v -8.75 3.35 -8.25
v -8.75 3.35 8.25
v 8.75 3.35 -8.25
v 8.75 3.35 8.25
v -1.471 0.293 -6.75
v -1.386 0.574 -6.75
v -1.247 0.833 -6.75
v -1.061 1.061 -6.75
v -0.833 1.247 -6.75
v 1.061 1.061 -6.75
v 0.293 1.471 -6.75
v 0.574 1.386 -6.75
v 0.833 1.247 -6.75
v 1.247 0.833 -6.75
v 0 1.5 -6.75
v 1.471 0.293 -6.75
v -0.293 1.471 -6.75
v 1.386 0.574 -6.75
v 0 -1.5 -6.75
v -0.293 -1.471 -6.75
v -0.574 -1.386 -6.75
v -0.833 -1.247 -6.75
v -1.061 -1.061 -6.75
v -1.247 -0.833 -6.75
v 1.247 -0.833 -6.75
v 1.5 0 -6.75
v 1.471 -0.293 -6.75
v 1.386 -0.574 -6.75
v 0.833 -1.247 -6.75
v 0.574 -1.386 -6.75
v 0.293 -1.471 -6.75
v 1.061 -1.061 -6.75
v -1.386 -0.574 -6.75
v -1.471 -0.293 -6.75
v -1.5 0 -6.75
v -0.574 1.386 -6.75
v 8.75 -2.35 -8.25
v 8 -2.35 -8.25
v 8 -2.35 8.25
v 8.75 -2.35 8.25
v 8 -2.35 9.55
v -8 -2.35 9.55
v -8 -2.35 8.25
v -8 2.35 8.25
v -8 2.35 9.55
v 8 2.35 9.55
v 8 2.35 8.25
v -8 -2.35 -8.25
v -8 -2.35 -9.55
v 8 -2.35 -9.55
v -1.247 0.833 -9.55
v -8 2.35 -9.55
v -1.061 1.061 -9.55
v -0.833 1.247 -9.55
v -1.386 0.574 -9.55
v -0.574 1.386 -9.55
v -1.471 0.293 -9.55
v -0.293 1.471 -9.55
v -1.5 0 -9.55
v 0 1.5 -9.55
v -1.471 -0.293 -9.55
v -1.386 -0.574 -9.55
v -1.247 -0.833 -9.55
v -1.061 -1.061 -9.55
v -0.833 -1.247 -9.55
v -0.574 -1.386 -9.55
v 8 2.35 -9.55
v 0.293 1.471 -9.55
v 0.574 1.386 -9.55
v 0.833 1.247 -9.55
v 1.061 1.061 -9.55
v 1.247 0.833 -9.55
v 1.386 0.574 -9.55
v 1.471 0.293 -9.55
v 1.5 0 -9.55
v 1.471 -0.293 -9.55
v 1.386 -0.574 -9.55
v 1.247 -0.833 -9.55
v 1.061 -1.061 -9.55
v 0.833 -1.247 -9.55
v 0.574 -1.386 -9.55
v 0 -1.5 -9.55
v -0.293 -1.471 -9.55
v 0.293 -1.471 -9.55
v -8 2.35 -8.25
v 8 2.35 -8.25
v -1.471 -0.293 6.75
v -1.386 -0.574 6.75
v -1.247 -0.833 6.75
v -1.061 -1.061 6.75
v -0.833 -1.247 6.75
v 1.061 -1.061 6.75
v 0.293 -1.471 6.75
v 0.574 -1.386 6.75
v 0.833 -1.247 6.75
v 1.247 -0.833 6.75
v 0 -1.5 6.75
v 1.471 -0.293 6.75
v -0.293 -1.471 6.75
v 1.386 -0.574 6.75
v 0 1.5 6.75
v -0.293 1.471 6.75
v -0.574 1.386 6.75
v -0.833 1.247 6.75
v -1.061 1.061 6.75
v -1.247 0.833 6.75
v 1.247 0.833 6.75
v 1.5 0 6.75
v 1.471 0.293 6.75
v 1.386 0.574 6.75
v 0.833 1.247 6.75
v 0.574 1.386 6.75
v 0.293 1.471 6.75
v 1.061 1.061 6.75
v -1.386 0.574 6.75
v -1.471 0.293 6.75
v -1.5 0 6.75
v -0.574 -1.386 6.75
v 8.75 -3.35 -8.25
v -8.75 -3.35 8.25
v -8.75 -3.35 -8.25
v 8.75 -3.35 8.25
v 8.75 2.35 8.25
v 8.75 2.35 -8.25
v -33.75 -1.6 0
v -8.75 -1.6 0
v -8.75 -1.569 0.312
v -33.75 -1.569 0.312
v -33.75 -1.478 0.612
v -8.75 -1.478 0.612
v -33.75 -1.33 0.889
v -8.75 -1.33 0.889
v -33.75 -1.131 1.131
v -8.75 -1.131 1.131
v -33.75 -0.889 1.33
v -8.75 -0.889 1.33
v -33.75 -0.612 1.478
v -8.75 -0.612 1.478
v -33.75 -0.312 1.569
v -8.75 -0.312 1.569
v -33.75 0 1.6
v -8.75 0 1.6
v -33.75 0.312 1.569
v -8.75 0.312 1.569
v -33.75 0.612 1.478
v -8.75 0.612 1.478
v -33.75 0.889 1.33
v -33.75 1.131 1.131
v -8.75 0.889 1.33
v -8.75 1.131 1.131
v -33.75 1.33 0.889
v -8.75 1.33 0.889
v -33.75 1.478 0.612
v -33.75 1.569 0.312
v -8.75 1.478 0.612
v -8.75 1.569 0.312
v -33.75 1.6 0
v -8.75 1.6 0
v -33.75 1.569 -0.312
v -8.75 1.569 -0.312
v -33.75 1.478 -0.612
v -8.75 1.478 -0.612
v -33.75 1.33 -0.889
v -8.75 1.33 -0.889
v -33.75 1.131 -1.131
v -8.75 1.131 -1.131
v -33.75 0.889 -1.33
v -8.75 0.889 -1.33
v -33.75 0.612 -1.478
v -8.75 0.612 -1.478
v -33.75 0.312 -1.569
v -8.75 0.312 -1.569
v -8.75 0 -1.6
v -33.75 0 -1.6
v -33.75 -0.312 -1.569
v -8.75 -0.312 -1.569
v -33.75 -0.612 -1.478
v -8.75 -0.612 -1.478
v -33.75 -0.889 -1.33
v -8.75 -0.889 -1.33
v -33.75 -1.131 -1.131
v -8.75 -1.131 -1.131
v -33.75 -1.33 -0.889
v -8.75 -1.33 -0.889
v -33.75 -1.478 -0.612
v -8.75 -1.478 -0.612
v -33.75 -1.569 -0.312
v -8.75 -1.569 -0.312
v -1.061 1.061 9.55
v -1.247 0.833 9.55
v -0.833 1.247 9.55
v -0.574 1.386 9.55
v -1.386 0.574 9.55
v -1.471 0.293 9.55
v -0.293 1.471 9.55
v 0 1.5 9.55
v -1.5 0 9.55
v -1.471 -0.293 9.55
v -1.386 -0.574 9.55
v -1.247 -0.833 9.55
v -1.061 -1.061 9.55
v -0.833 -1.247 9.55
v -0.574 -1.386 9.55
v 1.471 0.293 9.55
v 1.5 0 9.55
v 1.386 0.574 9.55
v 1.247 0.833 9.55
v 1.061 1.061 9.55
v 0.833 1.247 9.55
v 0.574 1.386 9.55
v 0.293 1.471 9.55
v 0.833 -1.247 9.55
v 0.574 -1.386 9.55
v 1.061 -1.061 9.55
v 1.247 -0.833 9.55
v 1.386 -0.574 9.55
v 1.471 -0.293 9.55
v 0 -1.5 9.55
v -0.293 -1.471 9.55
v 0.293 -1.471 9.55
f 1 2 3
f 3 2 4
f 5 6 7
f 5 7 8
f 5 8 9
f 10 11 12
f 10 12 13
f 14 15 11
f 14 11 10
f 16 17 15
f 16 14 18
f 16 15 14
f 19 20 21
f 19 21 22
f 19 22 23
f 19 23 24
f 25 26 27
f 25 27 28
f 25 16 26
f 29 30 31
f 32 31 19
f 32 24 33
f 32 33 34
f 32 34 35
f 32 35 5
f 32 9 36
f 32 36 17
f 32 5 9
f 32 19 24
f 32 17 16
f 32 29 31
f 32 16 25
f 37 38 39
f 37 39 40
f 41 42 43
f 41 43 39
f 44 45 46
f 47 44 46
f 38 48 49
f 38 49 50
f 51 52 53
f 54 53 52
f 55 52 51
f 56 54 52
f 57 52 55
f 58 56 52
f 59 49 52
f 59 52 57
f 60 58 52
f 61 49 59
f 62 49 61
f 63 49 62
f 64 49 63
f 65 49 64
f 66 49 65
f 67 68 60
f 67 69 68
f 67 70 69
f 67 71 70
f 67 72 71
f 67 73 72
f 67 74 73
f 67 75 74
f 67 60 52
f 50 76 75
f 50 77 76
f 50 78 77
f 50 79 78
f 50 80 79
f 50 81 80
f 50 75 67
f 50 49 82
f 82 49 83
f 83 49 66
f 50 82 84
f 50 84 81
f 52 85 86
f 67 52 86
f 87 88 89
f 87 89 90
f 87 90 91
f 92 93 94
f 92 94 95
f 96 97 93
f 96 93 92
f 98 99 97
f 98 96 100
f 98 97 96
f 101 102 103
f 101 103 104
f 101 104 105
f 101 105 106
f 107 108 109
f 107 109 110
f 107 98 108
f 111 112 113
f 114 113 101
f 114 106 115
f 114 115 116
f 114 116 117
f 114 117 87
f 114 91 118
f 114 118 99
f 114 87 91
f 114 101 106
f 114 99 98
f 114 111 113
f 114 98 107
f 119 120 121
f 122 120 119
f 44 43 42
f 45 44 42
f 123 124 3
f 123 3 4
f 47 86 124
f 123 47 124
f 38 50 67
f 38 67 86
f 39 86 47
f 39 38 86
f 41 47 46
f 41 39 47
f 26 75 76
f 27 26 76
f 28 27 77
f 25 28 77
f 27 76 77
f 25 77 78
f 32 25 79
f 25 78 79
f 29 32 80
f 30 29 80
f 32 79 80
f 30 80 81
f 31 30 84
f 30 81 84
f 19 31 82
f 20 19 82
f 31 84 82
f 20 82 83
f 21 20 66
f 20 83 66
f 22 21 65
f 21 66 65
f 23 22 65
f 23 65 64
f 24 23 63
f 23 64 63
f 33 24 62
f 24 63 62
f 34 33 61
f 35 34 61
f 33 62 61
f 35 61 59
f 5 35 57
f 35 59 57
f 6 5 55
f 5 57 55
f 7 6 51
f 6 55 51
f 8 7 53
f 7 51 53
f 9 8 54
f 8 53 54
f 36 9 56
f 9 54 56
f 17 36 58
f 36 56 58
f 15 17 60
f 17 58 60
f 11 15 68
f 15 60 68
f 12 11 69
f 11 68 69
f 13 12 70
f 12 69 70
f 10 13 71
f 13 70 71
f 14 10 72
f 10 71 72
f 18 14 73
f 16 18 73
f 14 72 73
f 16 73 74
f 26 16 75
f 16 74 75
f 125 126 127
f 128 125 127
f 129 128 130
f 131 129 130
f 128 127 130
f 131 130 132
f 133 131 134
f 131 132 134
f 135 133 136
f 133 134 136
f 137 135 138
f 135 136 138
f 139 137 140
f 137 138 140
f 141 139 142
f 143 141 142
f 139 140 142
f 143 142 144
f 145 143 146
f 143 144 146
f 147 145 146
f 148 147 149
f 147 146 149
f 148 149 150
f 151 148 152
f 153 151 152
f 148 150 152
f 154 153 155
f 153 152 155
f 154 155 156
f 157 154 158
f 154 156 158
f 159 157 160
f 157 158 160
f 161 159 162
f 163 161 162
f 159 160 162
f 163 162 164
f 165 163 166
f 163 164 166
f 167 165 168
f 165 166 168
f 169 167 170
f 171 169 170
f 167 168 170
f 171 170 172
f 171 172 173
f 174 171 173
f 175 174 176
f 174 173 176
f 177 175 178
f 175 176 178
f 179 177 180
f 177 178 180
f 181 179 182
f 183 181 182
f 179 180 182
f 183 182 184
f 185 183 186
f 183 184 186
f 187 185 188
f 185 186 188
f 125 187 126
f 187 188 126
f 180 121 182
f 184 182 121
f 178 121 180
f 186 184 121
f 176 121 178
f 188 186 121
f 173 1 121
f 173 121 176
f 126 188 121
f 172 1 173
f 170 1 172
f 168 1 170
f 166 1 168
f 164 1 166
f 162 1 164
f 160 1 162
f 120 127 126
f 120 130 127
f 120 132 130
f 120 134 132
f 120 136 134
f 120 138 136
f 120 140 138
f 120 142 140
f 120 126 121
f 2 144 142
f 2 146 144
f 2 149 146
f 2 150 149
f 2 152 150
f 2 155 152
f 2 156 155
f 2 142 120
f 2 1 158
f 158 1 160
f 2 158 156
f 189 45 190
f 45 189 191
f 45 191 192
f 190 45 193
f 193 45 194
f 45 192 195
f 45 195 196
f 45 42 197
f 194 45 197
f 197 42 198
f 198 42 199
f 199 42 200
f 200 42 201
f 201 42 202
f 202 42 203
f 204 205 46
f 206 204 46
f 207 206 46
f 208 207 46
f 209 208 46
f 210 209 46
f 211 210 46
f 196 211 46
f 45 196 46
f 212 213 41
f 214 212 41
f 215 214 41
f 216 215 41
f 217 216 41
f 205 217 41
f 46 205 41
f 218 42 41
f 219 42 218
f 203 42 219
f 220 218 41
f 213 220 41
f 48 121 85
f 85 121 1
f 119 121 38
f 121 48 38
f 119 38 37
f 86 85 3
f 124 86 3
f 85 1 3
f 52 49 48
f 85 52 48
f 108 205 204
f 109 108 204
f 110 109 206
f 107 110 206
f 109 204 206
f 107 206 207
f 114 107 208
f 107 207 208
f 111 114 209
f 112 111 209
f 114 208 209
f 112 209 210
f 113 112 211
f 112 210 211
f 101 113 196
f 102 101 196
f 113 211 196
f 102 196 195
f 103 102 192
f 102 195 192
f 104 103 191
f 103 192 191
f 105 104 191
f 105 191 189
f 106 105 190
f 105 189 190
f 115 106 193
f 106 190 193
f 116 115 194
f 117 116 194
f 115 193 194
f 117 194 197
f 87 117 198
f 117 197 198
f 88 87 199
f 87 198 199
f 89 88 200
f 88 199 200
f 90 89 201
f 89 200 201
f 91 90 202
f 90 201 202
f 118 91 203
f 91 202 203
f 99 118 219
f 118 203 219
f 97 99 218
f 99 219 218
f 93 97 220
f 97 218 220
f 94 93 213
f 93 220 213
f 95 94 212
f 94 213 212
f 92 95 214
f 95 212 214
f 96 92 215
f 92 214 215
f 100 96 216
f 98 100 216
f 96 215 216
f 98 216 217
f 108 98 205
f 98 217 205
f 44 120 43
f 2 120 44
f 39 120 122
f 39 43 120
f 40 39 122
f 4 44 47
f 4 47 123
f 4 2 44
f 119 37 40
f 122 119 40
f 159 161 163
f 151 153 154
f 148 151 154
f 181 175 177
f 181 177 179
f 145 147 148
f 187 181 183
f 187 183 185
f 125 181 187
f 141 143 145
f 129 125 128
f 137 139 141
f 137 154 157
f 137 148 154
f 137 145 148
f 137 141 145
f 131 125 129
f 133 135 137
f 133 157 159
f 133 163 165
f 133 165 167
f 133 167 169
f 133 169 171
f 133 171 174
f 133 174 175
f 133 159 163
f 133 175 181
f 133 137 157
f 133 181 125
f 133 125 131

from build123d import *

# Parameters (mm, degrees)
F0_W      = 16
F0_H      = 19.1
F1_DEPTH  = 2.35
F2_W      = 17.5
F2_H      = 16.5
F3_DEPTH  = 1
F4_DEPTH  = 2.35
F6_R      = 1.6
F7_DEPTH  = 25
F8_R      = 1.5
F9_DEPTH  = 2.8
F10_R     = 1.5
F11_DEPTH = 2.8


with BuildPart() as f1:
    # F0 (on Front) → F1 (new body)
    with BuildSketch(Plane.XZ):
        Rectangle(F0_W, F0_H)
    extrude(amount=F1_DEPTH)

    # F2 (on face) → F3 (join)
    with BuildSketch(Plane.XZ.offset(2.35)):
        Rectangle(F2_W, F2_H)
    extrude(amount=F3_DEPTH)

    # F4 (add, through all): a face of the model
    f4_faces = [f1.faces().sort_by_distance(p)[0] for p in [
        (-8.375, -2.35, 0),
    ]]
    extrude(f4_faces, amount=F4_DEPTH)

    # F5: F1 across plane


with BuildPart() as f1_1:
    add(f1.part)
    add(f1.part.mirror(Plane.XZ))

    # F6 (on face) → F7 (join)
    with BuildSketch(Plane(origin=(-8.75, 0, 0), x_dir=(0, -1, 0), z_dir=(-1, 0, 0))):
        Circle(F6_R)
    extrude(amount=F7_DEPTH)

    # F8 (on face) → F9 (cut)
    with BuildSketch(Plane.XY.offset(9.55)):
        Circle(F8_R)
    extrude(amount=-F9_DEPTH, mode=Mode.SUBTRACT)

    # F10 (on face) → F11 (cut)
    with BuildSketch(Plane(origin=(0, 0, -9.55), x_dir=(1, 0, 0), z_dir=(0, 0, -1))):
        Circle(F10_R)
    extrude(amount=-F11_DEPTH, mode=Mode.SUBTRACT)


solid = f1_1.part
